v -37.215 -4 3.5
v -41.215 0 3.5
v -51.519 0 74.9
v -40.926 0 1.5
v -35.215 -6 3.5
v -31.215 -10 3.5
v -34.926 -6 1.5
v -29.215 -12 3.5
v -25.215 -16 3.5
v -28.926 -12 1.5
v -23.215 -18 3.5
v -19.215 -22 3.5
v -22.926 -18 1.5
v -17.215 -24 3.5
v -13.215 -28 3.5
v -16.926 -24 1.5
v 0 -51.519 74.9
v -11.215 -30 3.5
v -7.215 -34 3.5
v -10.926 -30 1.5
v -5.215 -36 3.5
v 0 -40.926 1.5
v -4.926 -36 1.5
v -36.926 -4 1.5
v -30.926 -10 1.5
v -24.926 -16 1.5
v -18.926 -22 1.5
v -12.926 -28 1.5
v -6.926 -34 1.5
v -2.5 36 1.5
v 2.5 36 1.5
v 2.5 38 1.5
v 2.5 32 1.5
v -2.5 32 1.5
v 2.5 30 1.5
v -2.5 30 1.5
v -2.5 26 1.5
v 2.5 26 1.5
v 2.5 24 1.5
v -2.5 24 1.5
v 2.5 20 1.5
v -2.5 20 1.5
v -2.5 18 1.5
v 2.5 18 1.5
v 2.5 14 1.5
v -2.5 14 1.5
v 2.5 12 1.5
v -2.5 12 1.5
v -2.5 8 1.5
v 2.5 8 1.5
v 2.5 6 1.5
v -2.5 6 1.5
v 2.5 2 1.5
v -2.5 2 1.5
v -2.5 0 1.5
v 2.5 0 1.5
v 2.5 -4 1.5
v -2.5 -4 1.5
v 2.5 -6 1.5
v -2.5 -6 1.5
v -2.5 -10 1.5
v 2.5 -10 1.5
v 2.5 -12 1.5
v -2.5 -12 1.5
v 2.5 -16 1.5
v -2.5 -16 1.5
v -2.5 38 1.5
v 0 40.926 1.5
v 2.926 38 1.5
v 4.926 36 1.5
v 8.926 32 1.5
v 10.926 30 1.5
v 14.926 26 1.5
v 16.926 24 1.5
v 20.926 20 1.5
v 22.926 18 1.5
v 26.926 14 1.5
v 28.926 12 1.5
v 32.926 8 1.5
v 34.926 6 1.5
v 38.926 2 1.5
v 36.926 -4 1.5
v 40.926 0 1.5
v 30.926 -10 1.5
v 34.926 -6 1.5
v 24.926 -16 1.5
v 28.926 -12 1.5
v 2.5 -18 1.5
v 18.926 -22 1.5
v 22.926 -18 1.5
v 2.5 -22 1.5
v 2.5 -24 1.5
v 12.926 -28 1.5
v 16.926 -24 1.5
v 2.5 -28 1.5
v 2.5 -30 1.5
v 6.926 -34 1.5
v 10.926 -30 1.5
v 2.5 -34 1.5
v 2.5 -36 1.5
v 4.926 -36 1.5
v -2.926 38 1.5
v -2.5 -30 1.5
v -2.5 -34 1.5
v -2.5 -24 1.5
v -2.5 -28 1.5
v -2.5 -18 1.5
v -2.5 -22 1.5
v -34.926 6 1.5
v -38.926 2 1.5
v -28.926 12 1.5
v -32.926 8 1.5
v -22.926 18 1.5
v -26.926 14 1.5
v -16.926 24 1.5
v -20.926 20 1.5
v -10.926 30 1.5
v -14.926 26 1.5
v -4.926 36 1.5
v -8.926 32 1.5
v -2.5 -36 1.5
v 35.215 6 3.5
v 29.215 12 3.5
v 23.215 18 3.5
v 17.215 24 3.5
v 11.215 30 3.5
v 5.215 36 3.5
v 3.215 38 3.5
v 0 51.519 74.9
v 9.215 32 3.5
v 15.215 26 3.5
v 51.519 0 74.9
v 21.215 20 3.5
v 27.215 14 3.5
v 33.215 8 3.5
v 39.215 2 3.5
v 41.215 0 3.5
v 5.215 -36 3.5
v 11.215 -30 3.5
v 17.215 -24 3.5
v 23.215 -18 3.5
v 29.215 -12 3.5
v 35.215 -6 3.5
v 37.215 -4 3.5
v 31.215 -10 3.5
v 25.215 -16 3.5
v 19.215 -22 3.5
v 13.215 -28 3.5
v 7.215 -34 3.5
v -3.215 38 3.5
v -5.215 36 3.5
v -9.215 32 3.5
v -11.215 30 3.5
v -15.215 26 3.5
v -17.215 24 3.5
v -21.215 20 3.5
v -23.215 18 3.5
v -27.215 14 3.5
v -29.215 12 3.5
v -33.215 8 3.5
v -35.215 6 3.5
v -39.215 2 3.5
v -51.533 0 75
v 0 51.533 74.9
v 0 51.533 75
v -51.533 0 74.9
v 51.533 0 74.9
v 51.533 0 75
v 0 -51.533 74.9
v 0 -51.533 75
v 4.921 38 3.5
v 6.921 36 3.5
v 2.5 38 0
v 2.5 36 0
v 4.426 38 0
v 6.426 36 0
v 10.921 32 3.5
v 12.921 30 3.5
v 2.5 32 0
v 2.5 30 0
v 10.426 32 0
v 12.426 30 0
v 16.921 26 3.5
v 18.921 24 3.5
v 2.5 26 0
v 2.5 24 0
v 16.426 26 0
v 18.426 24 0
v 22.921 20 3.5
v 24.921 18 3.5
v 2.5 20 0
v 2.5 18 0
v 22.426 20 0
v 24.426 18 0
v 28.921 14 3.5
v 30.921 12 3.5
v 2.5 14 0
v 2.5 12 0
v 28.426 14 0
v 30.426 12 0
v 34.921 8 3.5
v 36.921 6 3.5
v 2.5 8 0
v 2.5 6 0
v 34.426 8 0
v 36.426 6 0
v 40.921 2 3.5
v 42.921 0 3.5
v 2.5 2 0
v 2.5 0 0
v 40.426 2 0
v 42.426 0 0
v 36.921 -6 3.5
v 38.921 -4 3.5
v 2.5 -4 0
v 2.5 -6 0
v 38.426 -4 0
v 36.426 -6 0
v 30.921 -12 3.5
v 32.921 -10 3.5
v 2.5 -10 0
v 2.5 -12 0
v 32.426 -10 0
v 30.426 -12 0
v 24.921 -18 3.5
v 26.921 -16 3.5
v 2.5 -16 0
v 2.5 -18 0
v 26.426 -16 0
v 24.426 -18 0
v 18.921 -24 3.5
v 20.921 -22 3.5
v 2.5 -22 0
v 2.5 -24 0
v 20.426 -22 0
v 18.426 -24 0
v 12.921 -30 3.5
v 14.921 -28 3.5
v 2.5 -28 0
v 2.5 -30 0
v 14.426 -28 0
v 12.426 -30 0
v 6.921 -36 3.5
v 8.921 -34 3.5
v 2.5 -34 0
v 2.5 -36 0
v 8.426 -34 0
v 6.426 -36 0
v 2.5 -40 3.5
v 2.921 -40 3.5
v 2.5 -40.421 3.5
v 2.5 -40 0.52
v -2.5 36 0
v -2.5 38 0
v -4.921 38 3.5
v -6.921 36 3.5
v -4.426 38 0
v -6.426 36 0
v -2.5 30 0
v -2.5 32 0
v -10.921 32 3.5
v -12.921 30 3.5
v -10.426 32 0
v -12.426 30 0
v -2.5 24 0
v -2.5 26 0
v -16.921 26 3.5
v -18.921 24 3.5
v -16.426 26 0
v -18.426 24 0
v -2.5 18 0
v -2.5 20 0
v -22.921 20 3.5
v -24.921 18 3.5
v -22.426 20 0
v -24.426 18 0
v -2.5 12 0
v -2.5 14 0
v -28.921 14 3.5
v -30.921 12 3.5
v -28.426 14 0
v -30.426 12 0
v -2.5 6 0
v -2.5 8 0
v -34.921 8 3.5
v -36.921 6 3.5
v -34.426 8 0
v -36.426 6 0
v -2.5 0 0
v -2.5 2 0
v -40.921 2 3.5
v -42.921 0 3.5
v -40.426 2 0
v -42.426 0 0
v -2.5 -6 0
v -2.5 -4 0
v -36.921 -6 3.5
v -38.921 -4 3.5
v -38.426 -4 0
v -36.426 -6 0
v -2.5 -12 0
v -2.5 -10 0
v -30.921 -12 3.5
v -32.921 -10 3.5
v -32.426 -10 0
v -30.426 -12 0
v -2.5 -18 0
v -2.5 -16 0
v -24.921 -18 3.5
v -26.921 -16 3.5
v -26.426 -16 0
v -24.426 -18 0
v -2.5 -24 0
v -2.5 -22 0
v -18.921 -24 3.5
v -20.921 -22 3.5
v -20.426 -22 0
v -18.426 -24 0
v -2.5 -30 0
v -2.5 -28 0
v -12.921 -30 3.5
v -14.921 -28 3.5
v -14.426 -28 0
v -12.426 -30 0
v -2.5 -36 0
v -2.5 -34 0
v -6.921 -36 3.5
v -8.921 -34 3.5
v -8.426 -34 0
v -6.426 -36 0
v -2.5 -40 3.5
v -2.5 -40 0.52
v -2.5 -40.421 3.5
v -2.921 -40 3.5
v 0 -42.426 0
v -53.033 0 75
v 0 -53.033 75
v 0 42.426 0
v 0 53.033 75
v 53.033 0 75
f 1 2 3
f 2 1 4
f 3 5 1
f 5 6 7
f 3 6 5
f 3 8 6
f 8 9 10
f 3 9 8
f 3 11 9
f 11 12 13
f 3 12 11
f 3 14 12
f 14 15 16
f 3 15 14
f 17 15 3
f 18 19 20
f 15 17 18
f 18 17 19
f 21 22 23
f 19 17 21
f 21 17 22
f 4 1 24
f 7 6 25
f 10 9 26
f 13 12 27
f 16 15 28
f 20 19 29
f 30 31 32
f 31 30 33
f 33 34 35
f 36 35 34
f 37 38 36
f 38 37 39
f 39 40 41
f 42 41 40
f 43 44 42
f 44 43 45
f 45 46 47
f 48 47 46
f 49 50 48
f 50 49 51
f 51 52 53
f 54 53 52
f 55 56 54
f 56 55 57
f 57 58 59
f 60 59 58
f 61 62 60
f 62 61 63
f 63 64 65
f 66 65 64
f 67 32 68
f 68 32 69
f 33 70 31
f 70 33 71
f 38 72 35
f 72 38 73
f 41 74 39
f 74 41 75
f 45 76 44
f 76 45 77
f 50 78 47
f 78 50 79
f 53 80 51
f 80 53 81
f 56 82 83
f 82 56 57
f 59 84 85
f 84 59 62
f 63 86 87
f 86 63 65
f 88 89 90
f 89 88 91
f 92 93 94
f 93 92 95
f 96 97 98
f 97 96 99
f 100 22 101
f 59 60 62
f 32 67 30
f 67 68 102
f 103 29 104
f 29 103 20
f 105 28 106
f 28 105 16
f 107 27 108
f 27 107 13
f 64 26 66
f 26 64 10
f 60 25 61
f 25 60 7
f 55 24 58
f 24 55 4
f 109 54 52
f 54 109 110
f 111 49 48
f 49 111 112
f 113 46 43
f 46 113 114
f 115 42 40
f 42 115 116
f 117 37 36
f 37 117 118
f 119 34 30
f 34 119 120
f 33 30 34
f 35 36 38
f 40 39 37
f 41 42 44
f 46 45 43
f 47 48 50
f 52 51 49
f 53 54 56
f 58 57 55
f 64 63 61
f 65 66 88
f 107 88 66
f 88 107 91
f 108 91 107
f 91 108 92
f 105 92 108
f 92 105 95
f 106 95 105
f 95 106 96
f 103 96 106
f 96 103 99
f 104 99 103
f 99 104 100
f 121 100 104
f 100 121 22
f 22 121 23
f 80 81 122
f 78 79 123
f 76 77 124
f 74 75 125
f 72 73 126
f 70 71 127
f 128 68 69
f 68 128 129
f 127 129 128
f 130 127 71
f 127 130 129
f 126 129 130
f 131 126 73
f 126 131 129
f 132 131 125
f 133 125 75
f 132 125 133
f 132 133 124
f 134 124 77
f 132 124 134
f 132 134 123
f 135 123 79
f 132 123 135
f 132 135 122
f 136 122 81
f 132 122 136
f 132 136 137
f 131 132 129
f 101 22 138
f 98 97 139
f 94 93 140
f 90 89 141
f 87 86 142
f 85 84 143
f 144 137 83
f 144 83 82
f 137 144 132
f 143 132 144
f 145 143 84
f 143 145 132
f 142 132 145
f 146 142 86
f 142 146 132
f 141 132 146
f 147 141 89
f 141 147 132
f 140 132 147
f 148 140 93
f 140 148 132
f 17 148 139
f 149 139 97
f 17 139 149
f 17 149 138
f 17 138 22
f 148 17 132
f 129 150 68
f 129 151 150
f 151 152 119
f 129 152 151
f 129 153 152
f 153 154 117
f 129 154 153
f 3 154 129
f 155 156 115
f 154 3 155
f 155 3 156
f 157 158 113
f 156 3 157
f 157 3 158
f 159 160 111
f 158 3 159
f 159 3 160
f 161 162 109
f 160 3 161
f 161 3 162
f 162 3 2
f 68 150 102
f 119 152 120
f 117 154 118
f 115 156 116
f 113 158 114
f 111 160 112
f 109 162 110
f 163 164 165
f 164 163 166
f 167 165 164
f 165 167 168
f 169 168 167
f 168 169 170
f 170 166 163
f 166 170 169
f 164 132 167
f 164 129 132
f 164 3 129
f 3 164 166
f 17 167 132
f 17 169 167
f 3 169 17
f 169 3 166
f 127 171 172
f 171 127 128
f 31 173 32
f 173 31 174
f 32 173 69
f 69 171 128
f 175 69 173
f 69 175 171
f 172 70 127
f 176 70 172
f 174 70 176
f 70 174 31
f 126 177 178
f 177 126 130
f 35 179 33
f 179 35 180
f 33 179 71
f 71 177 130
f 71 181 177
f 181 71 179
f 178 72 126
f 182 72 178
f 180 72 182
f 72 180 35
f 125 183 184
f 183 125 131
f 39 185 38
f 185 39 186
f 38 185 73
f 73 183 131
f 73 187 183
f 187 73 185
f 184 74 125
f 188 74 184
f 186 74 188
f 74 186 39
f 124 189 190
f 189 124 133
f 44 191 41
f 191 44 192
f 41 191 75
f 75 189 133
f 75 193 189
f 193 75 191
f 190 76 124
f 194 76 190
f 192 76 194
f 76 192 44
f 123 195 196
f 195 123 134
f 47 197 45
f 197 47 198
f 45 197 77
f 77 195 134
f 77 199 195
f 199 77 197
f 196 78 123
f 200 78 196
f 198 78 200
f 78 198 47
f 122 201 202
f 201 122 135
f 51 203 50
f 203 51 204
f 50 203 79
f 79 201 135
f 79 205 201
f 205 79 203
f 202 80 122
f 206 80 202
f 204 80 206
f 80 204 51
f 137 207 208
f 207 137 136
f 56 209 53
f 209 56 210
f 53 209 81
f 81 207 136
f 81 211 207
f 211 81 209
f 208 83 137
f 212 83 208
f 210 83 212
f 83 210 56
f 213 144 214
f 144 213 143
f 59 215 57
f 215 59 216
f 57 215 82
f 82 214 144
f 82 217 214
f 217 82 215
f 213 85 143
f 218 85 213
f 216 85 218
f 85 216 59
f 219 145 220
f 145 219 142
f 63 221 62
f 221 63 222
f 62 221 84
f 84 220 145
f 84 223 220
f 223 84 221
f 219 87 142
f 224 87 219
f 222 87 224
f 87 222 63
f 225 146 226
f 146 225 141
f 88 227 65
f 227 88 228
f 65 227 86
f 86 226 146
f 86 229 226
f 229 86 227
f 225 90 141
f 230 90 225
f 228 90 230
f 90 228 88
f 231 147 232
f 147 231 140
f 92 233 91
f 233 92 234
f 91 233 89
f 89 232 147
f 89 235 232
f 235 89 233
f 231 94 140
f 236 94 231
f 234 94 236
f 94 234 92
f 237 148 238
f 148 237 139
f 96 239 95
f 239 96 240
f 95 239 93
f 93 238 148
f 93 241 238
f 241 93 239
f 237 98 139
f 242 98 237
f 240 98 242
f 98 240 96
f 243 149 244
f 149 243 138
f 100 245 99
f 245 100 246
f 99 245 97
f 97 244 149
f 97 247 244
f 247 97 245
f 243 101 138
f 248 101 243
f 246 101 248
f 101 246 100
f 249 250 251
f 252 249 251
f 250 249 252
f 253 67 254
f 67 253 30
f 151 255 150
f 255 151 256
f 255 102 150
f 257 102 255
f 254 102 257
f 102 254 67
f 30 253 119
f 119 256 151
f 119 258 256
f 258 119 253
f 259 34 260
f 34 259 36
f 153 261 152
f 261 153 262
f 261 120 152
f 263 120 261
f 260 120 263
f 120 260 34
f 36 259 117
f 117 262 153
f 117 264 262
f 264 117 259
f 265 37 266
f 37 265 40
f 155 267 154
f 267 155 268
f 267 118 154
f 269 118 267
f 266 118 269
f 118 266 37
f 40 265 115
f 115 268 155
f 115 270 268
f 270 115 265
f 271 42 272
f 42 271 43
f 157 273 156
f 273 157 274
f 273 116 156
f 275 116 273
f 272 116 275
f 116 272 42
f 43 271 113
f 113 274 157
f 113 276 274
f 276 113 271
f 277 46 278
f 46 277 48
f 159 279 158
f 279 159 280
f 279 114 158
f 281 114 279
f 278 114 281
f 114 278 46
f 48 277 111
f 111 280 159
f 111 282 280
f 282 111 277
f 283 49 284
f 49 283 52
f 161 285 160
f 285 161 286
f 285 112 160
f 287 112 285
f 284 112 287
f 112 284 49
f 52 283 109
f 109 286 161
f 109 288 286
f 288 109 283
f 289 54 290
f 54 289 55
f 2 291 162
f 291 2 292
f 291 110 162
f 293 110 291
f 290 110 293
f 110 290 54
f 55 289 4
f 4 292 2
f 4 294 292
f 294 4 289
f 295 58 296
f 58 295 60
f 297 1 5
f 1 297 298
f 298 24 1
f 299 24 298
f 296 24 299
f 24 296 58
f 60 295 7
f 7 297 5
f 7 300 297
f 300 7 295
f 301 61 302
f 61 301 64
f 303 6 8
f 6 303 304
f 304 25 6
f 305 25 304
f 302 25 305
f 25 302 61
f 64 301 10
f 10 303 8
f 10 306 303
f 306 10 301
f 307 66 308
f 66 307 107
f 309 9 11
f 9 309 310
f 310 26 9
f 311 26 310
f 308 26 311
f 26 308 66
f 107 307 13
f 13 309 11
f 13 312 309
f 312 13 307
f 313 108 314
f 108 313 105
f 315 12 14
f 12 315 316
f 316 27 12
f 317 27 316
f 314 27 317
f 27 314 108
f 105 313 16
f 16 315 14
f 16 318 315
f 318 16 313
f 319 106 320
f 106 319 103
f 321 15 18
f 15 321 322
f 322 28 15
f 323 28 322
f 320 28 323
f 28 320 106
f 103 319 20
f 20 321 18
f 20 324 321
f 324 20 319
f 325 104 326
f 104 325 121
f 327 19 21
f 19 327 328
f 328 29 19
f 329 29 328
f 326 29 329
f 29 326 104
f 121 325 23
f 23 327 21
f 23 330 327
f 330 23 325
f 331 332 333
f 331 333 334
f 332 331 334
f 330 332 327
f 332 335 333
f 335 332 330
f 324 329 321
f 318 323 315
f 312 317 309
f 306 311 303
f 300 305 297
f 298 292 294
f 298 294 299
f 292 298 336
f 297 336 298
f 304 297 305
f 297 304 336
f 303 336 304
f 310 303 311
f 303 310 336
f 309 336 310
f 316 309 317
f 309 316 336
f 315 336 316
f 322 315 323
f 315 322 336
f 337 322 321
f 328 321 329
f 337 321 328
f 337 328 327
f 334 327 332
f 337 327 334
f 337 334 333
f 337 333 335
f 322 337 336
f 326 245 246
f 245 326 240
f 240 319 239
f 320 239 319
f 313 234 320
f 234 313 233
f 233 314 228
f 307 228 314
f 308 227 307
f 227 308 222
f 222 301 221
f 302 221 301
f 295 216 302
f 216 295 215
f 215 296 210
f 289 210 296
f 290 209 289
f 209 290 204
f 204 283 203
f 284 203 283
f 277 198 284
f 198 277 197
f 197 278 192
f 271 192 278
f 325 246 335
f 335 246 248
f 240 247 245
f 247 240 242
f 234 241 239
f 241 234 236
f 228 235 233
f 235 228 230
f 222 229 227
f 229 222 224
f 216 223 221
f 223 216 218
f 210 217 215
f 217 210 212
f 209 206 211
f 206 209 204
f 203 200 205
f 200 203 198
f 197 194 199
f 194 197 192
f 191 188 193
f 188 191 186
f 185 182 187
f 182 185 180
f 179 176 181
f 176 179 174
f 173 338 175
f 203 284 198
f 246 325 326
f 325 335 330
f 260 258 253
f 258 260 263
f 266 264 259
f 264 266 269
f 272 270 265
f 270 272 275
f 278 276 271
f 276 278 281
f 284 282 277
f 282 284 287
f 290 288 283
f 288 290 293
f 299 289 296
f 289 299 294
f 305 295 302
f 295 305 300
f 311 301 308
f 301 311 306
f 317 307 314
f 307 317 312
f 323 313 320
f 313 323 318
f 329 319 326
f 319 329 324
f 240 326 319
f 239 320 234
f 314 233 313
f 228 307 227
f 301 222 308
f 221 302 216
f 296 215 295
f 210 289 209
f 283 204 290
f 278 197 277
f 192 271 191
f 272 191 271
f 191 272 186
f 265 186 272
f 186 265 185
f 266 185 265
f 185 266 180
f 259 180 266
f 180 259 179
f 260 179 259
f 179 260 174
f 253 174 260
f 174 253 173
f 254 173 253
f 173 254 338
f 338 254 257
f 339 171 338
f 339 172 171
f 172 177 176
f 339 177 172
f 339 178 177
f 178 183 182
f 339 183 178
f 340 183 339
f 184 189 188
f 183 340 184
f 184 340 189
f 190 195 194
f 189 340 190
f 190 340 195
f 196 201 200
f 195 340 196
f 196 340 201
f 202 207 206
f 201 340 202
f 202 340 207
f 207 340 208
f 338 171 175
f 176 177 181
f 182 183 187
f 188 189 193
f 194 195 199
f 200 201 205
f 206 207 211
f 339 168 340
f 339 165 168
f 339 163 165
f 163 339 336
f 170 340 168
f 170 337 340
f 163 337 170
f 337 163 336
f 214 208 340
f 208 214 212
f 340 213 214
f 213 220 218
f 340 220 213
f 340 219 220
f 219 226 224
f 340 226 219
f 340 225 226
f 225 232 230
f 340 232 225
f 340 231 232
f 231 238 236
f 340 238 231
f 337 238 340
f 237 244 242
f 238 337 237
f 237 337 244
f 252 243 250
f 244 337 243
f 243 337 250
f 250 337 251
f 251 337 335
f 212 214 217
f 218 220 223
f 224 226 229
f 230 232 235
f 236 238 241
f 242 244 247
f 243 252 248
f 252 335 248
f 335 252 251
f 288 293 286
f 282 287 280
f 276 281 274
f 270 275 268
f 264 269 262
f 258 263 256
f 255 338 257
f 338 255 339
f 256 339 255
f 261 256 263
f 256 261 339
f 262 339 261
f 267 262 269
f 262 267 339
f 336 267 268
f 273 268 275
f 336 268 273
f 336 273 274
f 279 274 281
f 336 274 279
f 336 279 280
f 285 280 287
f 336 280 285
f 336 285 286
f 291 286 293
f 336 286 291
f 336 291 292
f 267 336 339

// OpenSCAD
// preview[view:north east, tilt:top]

// Shape
shape = 1; // [1:Square,0:Round]

// Size of bottom
bottom = 60; // [30:1:150]

// Size of top
top = 75; // [30:1:150]

// Height of flower pot
height = 75; // [30:1:150]

// How thick do you want the flower pot?
t = 1.5; // [1:0.1:5]

// Do you want perforation in the bottom?
holes = 1; // [1:Yes,0:No]

// Do you want a perforated wall?
perforate = 0; // [1:Yes,0:No]

// Do you want a brim?
brim = 0; // [1:Yes,0:No]

// Do you want feet? (NB! Experimental, need support when printing)
feet = 0; // [1:Yes,0:No]

/* [Hidden] */
detail = 10;
sqr2 = sqrt(2);

// Difference will construct a main shape and subtract cut outs
difference() {
  //***********
  // Main Shape
  //***********
    
  union(){    
    // Flower pot cup
    difference() {      
      
      // Flower pot solid
      union(){
          
        // Brim
        if (brim == 1) {
          translate([0,0,height-1]) {
            if (shape == 1) {
                cylinder(d1=top*sqr2+3,d2=top*sqr2+8,h=2,$fn=4);
              //}
            }
        
            if (shape == 0) {
              cylinder(d1=top+3,d2=top+8,h=2,$fn=60);
            }   
          }
        }
        
        // Main shape
        translate([0,0,0]) {
          if (shape == 1) {
            cylinder(d1=bottom*sqr2,d2=top*sqr2,h=height,$fn=4);
              
          if (feet == 1) {
            translate([bottom*sqr2/2-5,0,-5]) {
              cylinder(d1=10,d2=10,h=5,$fn=4);
            }
            
            translate([0,bottom*sqr2/2-5,-5]) {
              cylinder(d1=10,d2=10,h=5,$fn=4);
            }

            translate([-bottom*sqr2/2+5,0,-5]) {
              cylinder(d1=10,d2=10,h=5,$fn=4);
            }

            translate([0,-bottom*sqr2/2+5,-5]) {
              cylinder(d1=10,d2=10,h=5,$fn=4);
            }
            
            }

          }
          
          if (shape == 0) {
            cylinder(d1=bottom,d2=top,h=height,$fn=60);
              
             if (feet == 1) {
            translate([bottom/2-5,0,-5]) {
              cylinder(d1=10,d2=10,h=5,$fn=4);
            }
            
            translate([0,bottom/2-5,-5]) {
              cylinder(d1=10,d2=10,h=5,$fn=4);
            }

            translate([-bottom/2+5,0,-5]) {
              cylinder(d1=10,d2=10,h=5,$fn=4);
            }

            translate([0,-bottom/2+5,-5]) {
              cylinder(d1=10,d2=10,h=5,$fn=4);
            }
            
            }
              
          }
        }
        
        
        
      } // End Union
      
      union(){ // Union cut outs
          
      // Flower pot cut out
      translate([0,0,t]) {
        if (shape == 1) {
          cylinder(d1=bottom*sqr2-t*2,d2=top*sqr2-t*2,h=height-t,$fn=4);
          translate([0,0,height-t-0.1]) {
            cylinder(d1=top*sqr2-t*2,d2=top*sqr2-t*2,h=t*2+5,$fn=4);
          }
        }
        
        if (shape == 0) {
          cylinder(d1=bottom-t*2,d2=top-t*2,h=height-t,$fn=60);
          translate([0,0,height-t-0.1]) {
            cylinder(d1=top-t*2,d2=top-t*2,h=t*2+5,$fn=60);
          }
        }
        
      }
      
     //  translate([0,0,height-t]) {
     //    cylinder(d1=top*sqr2-t,d2=top*sqr2-t,h=t*2+5,$fn=4);
     //  }
      
      if (perforate == 1) {
      for (rotation =[0:600/bottom:360]) {
            rotate([0,0,rotation]) {
                translate([bottom/3,0,t+5]) {
                    rotate([0,0,0]) {
                        // Draw blades
                        cube([top,2,height/2-10],false);
                    } // End rotate
                } // End translate       
            } // End rotate
        } // End for spaceW
        
          for (rotation =[0:600/top:360]) {
            rotate([0,0,rotation]) {
                translate([top/3,0,height/2+2.5]) {
                    rotate([0,0,0]) {
                        // Draw blades
                        cube([top,2,height/2-10],false);
                    } // End rotate
                } // End translate       
            } // End rotate
        } // End for spaceW
        }
      
      // Holes in the bottom Part 1
      if (holes == 1) {
          for (spaceW =[-bottom:6:bottom]) {
            translate([2.5,-spaceW,-1]) {
              cube([bottom,2,t+3],false);
            } // End translate
          } // End for spaceW
      
      // Holes in the bottom Part 2
          for (spaceW =[-bottom:6:bottom]) {
            translate([-bottom-2.5,-spaceW,-1]) {
              cube([bottom,2,t+3],false);
            } // End translate
          } // End for spaceW
      } // End if holes
      
      } // End union cut outs
    } // End difference flower pot
  } // End union
} // End difference  
